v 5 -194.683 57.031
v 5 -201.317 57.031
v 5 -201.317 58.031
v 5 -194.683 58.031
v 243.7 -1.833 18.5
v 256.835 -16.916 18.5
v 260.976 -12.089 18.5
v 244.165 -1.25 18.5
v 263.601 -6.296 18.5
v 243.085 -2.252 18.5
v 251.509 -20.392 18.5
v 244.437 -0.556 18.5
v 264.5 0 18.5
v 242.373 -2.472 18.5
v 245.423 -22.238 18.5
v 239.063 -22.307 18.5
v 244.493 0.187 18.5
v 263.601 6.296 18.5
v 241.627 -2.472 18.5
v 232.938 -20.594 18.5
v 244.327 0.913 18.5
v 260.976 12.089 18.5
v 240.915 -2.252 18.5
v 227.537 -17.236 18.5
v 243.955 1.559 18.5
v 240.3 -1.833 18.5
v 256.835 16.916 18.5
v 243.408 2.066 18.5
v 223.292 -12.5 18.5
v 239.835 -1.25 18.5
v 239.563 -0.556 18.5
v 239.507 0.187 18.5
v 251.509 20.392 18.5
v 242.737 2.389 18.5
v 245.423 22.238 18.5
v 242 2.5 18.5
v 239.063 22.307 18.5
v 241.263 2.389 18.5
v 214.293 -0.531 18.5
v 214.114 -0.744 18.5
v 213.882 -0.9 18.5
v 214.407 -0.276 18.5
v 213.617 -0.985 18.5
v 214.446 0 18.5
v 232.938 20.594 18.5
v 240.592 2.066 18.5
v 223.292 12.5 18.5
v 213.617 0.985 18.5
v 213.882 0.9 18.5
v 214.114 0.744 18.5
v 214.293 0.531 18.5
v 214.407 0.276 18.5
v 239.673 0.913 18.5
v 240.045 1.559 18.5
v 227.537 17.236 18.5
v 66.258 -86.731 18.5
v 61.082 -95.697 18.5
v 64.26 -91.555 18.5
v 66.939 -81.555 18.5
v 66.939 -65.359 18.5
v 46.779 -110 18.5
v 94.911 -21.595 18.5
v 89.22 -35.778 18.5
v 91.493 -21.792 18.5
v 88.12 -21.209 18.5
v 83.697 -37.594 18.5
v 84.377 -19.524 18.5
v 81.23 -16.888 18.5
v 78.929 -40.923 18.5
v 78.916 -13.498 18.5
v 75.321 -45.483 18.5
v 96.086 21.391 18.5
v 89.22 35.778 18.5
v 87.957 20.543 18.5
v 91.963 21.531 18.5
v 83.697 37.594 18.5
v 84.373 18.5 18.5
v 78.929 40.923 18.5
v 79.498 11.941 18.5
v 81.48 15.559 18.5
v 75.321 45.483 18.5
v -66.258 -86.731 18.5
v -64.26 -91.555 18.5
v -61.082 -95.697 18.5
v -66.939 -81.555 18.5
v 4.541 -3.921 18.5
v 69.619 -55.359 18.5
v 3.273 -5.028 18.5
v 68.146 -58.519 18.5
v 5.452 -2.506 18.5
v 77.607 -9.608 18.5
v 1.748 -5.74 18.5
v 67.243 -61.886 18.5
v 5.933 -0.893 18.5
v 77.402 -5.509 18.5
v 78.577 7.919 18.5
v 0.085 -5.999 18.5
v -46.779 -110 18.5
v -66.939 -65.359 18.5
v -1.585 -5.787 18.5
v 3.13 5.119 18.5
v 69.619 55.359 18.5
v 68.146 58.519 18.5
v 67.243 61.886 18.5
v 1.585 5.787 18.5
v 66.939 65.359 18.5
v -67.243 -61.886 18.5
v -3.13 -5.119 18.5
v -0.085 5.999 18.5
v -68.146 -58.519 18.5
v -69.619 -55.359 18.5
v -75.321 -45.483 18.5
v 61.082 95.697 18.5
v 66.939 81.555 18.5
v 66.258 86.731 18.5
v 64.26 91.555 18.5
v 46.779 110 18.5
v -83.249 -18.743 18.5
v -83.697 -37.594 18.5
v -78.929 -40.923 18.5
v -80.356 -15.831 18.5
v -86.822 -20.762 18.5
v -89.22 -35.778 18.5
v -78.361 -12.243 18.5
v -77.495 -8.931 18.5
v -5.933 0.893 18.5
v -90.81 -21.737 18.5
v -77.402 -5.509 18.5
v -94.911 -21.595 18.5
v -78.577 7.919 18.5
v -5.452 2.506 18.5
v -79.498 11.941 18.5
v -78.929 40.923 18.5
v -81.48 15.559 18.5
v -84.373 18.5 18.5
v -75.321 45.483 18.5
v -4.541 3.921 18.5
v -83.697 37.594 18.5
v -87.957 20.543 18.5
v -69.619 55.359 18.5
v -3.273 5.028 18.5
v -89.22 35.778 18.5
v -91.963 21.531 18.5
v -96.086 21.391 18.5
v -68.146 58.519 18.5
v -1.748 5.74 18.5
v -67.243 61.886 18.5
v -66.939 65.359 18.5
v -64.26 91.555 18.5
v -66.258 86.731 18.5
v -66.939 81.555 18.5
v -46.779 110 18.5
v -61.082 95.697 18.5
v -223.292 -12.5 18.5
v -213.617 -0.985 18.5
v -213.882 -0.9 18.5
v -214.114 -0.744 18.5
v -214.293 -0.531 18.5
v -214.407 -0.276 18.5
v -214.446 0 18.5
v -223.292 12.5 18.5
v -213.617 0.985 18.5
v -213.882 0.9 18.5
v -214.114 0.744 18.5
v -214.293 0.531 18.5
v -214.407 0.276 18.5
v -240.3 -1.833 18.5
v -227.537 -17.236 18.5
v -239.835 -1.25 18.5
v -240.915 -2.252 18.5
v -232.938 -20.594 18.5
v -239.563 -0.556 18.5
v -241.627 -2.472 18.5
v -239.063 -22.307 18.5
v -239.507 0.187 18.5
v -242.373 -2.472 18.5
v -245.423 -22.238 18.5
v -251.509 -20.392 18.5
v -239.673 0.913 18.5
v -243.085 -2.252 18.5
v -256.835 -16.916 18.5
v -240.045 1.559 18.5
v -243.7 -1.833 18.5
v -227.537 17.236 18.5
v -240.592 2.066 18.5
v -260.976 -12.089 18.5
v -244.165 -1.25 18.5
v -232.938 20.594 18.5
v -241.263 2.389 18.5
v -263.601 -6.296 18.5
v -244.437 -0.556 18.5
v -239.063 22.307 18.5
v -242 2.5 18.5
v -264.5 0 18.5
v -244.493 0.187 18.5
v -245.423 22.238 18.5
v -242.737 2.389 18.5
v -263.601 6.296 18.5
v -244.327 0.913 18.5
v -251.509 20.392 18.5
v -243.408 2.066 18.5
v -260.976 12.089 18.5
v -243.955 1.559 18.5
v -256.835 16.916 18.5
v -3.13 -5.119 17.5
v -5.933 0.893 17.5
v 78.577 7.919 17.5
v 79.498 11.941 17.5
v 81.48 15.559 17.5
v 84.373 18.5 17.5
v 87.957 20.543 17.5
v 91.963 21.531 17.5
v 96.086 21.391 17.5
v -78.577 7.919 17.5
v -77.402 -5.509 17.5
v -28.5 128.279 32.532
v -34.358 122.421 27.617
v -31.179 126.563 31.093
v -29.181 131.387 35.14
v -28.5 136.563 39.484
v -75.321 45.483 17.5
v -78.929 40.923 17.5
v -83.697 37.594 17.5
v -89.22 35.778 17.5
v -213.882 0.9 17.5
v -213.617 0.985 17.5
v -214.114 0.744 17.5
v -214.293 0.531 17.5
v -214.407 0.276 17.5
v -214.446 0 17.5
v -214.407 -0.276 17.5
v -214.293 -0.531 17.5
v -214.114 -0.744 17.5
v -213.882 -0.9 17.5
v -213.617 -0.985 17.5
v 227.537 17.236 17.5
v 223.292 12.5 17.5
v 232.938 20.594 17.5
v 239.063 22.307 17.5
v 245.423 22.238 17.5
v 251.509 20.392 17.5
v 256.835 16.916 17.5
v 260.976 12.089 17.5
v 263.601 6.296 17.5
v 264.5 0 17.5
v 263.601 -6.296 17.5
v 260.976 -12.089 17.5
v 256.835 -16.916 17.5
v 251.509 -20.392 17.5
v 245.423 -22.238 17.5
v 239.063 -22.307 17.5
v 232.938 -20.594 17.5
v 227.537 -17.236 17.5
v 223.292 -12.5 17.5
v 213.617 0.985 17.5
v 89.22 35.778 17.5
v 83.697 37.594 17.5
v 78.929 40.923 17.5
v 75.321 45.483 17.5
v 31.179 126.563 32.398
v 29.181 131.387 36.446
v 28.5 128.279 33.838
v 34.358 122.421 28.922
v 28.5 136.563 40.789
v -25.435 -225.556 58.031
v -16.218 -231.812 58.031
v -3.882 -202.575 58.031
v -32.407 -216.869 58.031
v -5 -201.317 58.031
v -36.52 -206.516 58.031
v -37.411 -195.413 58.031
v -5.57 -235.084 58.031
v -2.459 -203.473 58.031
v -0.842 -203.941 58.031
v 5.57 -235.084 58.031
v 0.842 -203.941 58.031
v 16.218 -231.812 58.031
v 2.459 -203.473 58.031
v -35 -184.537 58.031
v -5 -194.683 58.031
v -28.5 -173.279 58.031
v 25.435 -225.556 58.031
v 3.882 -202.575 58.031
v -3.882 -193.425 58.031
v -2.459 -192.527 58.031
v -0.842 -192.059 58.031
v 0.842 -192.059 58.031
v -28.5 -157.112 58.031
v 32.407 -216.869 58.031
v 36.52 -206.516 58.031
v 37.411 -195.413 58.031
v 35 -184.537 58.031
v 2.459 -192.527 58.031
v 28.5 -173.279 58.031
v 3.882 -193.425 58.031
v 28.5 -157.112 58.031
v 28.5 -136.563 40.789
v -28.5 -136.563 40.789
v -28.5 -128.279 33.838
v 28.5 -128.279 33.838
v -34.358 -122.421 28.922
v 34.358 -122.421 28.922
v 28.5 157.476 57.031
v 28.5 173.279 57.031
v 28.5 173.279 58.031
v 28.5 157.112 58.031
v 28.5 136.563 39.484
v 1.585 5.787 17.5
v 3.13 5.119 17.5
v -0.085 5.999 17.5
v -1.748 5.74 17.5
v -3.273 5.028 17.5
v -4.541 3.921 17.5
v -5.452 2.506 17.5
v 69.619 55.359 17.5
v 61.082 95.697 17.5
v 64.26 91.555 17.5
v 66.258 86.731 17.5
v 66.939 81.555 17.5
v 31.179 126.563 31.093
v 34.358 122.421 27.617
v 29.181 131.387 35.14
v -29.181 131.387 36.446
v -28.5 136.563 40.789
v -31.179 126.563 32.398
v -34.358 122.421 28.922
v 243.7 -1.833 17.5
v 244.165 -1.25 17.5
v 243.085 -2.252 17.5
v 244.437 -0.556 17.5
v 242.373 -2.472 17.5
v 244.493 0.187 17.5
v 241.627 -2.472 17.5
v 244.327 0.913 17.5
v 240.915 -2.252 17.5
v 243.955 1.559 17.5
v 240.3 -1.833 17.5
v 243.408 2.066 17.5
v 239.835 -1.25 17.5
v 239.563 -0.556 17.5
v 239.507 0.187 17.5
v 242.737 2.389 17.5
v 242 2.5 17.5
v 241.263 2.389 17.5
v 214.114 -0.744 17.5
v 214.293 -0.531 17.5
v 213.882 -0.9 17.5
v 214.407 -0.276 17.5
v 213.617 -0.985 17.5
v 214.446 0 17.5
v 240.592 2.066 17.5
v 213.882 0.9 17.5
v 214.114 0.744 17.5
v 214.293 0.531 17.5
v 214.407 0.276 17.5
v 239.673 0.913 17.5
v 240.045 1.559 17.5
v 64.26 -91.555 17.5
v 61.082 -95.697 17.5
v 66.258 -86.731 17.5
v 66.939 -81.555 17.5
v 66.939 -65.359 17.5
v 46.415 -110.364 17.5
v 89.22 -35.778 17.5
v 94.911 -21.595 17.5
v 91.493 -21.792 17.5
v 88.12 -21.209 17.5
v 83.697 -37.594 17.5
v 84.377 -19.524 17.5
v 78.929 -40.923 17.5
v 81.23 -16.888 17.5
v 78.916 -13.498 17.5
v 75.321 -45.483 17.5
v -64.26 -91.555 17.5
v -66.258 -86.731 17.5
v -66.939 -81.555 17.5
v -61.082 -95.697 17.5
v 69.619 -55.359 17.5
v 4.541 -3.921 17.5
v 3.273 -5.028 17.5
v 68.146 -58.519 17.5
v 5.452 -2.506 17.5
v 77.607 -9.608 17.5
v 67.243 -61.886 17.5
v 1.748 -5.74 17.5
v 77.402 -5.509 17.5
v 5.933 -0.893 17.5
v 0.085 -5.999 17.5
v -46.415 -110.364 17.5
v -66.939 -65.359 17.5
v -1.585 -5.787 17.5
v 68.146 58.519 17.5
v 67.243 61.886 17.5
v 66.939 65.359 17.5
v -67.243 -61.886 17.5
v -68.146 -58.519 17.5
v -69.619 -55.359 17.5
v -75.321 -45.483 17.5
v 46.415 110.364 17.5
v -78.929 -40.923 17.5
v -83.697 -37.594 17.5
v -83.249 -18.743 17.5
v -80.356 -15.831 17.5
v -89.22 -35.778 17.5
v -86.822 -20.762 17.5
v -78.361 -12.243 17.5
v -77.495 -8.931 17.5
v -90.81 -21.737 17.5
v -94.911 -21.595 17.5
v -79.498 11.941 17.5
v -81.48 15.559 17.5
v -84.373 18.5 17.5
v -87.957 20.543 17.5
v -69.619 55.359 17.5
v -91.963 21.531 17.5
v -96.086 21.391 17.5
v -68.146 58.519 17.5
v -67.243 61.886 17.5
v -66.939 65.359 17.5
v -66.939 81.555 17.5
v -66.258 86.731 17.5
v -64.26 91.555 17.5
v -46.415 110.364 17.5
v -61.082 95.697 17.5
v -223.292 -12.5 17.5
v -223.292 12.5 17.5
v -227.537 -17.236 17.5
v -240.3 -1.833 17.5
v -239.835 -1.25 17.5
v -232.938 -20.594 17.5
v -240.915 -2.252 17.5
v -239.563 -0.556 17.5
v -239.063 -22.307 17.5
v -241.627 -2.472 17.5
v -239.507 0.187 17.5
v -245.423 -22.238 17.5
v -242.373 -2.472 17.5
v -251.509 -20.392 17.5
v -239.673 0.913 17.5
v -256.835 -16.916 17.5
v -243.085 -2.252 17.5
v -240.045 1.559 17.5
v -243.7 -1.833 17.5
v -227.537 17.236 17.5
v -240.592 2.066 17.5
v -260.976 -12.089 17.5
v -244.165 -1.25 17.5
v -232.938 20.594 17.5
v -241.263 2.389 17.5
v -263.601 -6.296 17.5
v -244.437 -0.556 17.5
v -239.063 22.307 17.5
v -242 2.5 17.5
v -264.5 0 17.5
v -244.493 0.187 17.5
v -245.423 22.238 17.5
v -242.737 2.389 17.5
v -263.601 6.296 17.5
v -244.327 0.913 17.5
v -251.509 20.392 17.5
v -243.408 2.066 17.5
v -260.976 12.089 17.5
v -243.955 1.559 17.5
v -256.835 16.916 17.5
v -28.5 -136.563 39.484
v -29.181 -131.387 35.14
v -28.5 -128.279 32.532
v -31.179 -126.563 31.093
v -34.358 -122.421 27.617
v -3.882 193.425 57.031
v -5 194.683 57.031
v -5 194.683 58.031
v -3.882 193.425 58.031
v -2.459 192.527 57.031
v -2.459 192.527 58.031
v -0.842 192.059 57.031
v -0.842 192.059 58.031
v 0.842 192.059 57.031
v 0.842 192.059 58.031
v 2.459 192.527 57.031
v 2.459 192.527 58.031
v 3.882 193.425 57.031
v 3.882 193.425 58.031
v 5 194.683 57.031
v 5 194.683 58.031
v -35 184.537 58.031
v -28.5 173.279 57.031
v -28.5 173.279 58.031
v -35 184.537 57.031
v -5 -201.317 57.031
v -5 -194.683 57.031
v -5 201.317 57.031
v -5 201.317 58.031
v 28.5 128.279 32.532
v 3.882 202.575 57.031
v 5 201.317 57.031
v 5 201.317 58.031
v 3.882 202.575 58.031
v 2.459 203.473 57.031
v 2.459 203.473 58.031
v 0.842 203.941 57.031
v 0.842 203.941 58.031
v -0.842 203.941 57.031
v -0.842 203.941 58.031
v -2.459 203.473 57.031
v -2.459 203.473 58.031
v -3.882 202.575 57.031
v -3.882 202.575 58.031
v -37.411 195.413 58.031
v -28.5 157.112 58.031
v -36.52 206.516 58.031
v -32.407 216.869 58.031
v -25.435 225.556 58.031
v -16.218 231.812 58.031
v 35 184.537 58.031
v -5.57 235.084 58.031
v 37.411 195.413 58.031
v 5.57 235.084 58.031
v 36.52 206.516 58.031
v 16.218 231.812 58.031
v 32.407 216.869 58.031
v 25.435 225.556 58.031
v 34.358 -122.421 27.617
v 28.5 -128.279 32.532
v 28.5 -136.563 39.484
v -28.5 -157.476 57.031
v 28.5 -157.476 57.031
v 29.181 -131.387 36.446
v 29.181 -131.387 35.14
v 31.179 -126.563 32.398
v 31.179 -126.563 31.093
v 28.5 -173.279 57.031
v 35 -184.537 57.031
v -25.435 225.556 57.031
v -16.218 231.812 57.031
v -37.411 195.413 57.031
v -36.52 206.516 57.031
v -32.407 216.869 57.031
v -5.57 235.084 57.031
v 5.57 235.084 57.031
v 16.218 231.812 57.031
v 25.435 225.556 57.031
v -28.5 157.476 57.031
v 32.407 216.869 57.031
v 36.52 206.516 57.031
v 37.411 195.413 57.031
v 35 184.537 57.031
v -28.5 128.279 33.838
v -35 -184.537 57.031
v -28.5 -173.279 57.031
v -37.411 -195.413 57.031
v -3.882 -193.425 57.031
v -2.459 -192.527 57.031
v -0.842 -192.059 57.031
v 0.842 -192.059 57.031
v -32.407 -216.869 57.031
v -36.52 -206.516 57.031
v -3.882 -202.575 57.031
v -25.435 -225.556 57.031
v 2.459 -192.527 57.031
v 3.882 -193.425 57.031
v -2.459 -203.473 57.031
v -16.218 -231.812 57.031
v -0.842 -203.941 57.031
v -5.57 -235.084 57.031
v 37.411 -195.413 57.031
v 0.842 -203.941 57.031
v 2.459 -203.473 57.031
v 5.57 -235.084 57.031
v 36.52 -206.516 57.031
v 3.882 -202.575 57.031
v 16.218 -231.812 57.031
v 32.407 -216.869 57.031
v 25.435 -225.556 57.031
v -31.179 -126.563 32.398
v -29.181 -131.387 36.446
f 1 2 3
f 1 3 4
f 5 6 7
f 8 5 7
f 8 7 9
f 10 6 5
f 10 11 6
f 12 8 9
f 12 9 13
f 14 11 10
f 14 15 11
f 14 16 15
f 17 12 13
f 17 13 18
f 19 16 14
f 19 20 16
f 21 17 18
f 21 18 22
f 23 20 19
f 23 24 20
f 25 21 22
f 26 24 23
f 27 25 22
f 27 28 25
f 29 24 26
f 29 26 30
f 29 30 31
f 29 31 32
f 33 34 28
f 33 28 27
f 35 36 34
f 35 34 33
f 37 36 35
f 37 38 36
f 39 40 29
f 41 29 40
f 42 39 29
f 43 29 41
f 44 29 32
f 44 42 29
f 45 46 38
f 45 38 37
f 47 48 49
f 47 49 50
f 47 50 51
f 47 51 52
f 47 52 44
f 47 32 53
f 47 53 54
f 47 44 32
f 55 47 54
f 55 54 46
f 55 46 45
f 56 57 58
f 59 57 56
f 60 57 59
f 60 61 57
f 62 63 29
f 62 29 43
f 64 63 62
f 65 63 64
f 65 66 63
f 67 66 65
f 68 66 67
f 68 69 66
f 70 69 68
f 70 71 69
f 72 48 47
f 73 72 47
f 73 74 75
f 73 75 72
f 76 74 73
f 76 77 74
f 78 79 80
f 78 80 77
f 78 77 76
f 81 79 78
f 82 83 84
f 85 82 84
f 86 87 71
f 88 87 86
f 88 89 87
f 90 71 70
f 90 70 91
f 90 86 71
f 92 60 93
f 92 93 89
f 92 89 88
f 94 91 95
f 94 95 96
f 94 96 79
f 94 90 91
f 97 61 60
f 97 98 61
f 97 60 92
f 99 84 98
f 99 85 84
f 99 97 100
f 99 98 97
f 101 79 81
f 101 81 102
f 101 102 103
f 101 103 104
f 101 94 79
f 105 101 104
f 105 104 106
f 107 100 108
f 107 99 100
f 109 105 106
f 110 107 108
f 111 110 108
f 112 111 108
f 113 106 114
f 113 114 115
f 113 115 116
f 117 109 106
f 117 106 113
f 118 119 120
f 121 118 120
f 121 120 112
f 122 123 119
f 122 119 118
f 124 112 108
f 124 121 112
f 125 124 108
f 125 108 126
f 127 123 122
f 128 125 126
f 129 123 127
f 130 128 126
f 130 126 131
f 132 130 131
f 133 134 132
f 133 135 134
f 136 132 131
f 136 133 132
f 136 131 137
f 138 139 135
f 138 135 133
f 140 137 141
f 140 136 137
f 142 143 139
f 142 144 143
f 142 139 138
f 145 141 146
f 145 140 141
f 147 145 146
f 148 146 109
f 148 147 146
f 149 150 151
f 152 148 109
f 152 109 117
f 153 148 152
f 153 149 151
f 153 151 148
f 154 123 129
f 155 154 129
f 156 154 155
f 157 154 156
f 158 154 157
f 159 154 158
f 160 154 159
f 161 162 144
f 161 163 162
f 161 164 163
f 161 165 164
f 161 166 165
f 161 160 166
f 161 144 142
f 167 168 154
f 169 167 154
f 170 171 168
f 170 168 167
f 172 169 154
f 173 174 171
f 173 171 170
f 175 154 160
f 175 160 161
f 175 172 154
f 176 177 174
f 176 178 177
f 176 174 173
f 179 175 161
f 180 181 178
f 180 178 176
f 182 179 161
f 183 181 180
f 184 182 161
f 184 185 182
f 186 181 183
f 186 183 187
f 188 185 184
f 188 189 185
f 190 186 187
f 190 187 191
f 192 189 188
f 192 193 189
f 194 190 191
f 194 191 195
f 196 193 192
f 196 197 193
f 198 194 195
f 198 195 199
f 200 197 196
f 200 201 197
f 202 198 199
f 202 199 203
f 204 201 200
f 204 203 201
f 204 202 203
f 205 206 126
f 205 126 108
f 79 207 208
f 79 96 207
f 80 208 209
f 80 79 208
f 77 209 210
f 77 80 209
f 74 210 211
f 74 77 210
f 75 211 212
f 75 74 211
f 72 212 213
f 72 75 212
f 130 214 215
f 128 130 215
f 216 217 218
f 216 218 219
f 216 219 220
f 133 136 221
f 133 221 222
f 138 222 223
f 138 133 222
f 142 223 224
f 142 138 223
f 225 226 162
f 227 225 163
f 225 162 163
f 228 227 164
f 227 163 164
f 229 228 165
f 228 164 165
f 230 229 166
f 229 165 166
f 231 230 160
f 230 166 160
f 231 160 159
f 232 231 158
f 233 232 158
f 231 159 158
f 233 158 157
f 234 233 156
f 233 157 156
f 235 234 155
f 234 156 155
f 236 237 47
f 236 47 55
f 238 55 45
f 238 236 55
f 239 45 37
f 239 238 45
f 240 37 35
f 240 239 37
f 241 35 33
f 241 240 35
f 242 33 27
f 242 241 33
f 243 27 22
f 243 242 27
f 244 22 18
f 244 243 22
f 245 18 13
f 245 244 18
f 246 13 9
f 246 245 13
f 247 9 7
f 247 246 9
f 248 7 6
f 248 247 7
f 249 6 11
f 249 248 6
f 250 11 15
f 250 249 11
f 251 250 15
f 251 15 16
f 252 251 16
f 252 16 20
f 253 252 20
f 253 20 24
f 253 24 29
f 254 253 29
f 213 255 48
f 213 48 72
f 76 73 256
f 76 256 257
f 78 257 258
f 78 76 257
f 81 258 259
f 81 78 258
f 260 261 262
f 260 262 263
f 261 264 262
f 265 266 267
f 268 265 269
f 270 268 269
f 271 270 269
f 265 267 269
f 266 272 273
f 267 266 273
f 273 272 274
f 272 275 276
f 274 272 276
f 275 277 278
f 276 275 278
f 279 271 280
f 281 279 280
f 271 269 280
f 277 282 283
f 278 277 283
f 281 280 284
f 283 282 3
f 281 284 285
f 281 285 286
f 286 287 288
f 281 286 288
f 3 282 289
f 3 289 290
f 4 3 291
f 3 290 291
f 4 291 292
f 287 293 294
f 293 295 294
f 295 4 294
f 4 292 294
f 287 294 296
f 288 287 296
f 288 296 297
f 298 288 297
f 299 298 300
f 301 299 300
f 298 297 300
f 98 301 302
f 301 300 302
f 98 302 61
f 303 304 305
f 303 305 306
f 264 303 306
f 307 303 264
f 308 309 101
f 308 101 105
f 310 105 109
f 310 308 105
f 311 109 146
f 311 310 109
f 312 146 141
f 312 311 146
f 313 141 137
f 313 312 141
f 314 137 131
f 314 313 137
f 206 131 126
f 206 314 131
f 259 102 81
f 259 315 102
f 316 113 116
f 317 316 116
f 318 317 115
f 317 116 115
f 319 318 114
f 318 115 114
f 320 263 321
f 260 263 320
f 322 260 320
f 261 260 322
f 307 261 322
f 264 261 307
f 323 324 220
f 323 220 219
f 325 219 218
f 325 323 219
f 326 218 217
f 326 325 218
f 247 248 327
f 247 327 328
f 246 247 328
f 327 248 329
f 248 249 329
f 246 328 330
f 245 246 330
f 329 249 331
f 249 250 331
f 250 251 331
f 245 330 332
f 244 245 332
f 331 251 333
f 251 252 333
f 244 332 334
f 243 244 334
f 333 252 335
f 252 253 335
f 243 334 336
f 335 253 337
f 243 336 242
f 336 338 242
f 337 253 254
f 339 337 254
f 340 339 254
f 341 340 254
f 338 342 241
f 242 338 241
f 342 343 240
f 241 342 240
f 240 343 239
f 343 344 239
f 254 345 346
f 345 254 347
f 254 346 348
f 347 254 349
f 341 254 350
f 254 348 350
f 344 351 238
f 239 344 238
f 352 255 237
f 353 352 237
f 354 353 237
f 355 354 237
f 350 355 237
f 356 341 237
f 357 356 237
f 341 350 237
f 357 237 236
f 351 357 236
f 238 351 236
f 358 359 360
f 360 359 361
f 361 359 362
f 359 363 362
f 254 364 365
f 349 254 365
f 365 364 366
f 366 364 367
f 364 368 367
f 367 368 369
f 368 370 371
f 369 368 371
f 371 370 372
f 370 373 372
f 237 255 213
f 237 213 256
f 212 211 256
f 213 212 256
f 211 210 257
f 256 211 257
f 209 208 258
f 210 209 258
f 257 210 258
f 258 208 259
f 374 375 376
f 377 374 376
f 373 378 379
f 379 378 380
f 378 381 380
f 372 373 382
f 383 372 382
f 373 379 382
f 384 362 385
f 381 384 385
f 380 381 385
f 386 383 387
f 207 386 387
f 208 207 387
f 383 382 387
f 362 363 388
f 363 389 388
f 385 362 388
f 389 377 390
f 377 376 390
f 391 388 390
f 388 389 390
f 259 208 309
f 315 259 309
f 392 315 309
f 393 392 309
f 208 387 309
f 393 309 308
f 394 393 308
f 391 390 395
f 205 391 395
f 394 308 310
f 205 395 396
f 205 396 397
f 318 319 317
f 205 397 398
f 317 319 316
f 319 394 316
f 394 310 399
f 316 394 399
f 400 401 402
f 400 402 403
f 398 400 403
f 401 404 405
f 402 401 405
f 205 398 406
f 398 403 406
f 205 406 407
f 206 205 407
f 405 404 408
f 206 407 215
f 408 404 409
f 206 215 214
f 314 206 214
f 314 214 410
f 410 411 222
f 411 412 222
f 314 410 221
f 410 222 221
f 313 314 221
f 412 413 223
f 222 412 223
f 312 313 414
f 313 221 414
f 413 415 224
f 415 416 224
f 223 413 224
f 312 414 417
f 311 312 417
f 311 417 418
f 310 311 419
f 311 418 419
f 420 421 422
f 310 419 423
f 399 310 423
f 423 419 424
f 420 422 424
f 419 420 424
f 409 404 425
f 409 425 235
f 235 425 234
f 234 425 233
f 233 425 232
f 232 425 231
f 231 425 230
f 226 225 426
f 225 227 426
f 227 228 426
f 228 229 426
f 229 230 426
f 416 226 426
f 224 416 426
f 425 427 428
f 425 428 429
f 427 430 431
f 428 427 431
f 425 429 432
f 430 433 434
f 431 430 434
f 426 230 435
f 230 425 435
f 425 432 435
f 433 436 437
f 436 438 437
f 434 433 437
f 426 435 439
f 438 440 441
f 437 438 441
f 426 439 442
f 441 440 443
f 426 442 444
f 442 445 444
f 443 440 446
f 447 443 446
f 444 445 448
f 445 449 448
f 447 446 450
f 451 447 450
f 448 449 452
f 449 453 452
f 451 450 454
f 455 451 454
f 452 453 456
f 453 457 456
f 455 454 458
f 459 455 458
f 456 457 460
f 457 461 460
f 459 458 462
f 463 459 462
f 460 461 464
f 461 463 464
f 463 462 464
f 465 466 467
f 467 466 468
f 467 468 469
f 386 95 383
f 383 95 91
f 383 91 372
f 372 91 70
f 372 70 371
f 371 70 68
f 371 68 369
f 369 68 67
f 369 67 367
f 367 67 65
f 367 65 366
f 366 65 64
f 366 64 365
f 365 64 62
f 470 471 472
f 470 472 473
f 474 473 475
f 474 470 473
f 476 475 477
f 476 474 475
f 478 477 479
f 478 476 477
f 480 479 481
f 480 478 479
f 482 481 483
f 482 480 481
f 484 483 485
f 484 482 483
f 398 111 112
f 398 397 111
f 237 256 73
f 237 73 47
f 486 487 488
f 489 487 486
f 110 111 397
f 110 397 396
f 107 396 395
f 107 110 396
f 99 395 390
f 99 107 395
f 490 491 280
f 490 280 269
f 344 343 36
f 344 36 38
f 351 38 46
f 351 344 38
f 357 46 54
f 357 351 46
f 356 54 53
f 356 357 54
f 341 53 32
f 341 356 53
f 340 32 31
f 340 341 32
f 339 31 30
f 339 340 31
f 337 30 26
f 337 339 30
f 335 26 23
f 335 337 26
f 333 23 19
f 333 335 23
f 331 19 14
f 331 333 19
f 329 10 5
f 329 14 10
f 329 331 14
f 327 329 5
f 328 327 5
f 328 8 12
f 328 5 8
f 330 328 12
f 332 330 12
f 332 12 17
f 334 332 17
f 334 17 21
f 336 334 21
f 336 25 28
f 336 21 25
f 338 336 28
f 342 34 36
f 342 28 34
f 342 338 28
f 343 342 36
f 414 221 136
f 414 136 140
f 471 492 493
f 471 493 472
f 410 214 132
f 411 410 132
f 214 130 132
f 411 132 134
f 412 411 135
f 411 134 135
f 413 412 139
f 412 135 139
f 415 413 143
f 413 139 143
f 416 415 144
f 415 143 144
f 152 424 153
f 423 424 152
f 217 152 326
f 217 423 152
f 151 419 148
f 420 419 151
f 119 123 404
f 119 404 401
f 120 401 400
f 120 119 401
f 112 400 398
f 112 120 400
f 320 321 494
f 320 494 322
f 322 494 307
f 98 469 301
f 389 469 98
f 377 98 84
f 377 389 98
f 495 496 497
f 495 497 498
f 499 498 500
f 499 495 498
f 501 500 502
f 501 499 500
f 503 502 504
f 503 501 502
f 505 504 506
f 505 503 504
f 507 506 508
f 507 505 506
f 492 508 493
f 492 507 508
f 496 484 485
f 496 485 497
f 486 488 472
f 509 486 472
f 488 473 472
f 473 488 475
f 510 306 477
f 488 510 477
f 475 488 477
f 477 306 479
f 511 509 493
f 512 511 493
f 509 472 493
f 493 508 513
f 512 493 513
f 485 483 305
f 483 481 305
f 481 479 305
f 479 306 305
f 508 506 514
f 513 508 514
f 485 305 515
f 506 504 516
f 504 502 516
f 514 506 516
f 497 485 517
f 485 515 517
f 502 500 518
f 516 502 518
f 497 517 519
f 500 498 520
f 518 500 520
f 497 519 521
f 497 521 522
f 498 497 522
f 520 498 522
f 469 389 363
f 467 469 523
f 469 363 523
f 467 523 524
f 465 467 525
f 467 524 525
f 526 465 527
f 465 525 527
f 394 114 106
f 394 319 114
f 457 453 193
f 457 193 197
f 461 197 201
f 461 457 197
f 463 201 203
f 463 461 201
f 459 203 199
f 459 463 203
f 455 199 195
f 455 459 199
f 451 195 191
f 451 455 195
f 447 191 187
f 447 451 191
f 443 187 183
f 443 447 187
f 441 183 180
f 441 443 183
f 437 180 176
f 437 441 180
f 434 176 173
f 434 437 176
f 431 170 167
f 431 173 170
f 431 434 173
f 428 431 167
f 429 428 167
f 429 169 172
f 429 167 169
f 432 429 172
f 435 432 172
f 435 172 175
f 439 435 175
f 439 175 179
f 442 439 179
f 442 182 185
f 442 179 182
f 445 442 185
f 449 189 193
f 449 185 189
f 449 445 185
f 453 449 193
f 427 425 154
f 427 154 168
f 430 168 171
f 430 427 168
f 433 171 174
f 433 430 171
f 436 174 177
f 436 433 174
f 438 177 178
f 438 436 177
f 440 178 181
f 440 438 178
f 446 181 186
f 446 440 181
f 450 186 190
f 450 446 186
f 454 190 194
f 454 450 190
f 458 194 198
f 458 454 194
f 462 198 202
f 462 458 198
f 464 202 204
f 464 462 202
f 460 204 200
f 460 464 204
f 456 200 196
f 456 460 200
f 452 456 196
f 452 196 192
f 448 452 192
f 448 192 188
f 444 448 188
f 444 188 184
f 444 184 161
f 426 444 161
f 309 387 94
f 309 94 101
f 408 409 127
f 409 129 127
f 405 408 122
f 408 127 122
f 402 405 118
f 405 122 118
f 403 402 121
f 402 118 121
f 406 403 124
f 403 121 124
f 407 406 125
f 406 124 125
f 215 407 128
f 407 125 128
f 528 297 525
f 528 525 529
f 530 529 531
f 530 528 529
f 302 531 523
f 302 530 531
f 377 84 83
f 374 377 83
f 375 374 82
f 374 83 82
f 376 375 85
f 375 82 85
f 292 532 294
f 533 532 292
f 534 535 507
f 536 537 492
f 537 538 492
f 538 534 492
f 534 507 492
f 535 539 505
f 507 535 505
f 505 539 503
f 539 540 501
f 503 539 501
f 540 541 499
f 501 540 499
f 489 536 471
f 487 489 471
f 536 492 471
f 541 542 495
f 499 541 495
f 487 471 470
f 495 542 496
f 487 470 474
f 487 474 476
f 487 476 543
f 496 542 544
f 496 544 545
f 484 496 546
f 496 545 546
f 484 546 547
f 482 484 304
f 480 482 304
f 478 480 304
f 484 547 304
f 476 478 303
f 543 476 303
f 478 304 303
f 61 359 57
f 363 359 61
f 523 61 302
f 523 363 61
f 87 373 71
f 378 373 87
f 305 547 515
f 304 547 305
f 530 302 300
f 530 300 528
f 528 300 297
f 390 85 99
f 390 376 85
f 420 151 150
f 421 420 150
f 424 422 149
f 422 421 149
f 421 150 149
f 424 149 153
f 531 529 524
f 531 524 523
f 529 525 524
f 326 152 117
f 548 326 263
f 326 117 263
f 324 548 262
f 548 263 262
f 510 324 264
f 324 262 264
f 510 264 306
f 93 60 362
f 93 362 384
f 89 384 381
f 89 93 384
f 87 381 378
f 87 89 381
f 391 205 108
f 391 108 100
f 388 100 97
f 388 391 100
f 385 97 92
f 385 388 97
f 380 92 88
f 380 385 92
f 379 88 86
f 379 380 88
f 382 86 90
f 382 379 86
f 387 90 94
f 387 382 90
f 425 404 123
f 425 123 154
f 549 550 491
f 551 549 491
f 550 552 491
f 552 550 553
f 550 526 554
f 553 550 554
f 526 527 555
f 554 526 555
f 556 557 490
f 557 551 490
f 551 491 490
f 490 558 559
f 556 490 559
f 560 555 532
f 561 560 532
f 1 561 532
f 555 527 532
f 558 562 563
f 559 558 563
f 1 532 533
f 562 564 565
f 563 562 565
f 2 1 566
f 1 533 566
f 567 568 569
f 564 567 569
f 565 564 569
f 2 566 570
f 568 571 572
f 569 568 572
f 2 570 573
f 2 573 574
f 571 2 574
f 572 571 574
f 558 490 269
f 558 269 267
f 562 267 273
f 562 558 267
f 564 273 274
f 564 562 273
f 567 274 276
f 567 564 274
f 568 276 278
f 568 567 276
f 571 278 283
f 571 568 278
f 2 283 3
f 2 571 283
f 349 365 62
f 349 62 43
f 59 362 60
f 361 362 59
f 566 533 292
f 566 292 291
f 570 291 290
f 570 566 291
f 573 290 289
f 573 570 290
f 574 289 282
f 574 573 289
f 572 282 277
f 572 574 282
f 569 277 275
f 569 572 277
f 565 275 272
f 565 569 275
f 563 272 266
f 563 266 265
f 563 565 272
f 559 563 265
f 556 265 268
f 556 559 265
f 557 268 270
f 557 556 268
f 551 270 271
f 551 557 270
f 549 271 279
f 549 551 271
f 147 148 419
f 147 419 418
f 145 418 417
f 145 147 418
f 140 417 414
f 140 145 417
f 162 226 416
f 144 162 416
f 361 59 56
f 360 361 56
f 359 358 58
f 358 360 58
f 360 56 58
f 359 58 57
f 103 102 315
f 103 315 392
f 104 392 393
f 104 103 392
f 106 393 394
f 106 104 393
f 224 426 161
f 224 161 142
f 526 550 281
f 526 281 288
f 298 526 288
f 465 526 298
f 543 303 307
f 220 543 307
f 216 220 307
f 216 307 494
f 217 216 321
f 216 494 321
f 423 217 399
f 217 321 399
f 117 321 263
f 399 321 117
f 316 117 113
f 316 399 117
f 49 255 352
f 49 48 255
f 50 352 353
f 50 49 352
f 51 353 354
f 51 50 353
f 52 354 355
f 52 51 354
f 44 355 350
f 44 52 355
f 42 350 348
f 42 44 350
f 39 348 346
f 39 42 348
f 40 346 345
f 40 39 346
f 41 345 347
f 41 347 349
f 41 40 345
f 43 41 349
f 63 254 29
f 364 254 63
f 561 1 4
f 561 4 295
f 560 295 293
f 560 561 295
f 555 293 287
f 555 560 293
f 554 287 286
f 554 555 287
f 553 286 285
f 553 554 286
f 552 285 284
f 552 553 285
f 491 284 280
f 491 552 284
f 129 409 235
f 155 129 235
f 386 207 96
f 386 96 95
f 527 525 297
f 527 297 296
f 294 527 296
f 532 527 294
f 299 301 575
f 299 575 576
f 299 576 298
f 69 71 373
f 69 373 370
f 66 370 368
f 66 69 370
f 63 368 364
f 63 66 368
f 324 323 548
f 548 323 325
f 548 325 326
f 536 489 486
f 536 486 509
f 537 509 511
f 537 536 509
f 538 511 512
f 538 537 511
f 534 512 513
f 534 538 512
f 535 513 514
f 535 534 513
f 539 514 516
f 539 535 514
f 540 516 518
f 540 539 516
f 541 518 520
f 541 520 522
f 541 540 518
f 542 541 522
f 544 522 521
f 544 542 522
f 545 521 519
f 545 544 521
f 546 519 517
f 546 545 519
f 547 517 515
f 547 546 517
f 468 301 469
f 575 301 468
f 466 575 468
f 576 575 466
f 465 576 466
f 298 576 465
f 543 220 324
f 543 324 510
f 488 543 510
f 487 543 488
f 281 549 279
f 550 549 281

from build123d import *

# Parameters (mm, degrees)
SALIENTE_EXTRUIR1_DEPTH     = 271
CORTAR_EXTRUIR9_DEPTH       = 372.904084134
CORTAR_EXTRUIR9_DEPTH_BACK  = 372.904084134
CROQUIS4_R                  = 2.5
CORTAR_EXTRUIR10_DEPTH      = 372.904084134
CORTAR_EXTRUIR10_DEPTH_BACK = 372.904084134
CROQUIS2_W                  = 581.580028242
CROQUIS2_H                  = 554.061756016
REDONDEO1_R                 = 20
REDONDEO2_R                 = 15
REDONDEO3_R                 = 1


with BuildPart() as part:
    # Croquis1 → Saliente-Extruir1 (new, symmetric)
    with BuildSketch(Plane(origin=(0, 0, 0), x_dir=(0, 0, -1), z_dir=(1, 0, 0))):
        Polygon((-18.5, -110), (-18.5, 110), (-58.031437996, 157.111733252), (-58.031437996, 248), (-57.031437996, 248), (-57.031437996, 157.475703486), (-17.5, 110.363970234), (-17.5, -110.363970234), (-57.031437996, -157.475703486), (-57.031437996, -248), (-58.031437996, -248), (-58.031437996, -157.111733252), align=None)
    extrude(amount=SALIENTE_EXTRUIR1_DEPTH, both=True)

    # Croquis4 → Cortar-Extruir9 (cut, two sides: drawn at the far end of the back side and taken through both)
    with BuildSketch(Plane.XY.offset(-CORTAR_EXTRUIR9_DEPTH_BACK)):
        with Locations(Location((-242, 0, 0), (0, 0, 90))):
            Circle(CROQUIS4_R)
        with Locations(Location((242, 0, 0), (0, 0, 90))):
            Circle(CROQUIS4_R)
        with BuildLine():
            Line((-5, 201.31662479), (-5, 194.68337521))
            ThreePointArc((-5, 194.68337521), (0, 192), (5, 194.68337521))
            Line((5, 194.68337521), (5, 201.31662479))
            ThreePointArc((5, 201.31662479), (0, 204), (-5, 201.31662479))
        make_face()
        with BuildLine():
            Line((5, -201.31662479), (5, -194.68337521))
            ThreePointArc((5, -194.68337521), (0, -192), (-5, -194.68337521))
            Line((-5, -194.68337521), (-5, -201.31662479))
            ThreePointArc((-5, -201.31662479), (0, -204), (5, -201.31662479))
        make_face()
        with BuildLine():
            Line((-5.933205139, 0.892791565), (-3.129872731, -5.118974183))
            ThreePointArc((-3.129872731, -5.118974183), (2.53570957, -5.437846722), (5.933205139, -0.892791565))
            Line((5.933205139, -0.892791565), (3.129872731, 5.118974183))
            ThreePointArc((3.129872731, 5.118974183), (-2.53570957, 5.437846722), (-5.933205139, 0.892791565))
        make_face()
    extrude(amount=CORTAR_EXTRUIR9_DEPTH + CORTAR_EXTRUIR9_DEPTH_BACK, mode=Mode.SUBTRACT)

    # Croquis2 → Cortar-Extruir10 (cut, two sides: drawn at the far end of the back side and taken through both)
    # profile 1 of 3: a face of its own
    with BuildSketch(Plane.XY.offset(-CORTAR_EXTRUIR10_DEPTH_BACK)):
        Rectangle(CROQUIS2_W, CROQUIS2_H)
        with BuildLine():
            Line((80, 37.378360334), (223.291713066, 12.5))
            ThreePointArc((223.291713066, 12.5), (264.5, 0), (223.291713066, -12.5))
            Line((223.291713066, -12.5), (80, -37.378360334))
            Line((80, -37.378360334), (66.939390249, -60))
            Line((66.939390249, -60), (66.939390249, -89.839367484))
            Line((66.939390249, -89.839367484), (28.5, -128.278757733))
            Line((28.5, -128.278757733), (28.5, -173.278757733))
            Line((28.5, -173.278757733), (35, -184.537087982))
            ThreePointArc((35, -184.537087982), (0, -235.5), (-35, -184.537087982))
            Line((-35, -184.537087982), (-28.5, -173.278757733))
            Line((-28.5, -173.278757733), (-28.5, -128.278757733))
            Line((-28.5, -128.278757733), (-66.939390249, -89.839367484))
            Line((-66.939390249, -89.839367484), (-66.939390249, -60))
            Line((-66.939390249, -60), (-80, -37.378360334))
            Line((-80, -37.378360334), (-223.291713066, -12.5))
            ThreePointArc((-223.291713066, -12.5), (-264.5, 0), (-223.291713066, 12.5))
            Line((-223.291713066, 12.5), (-80, 37.378360334))
            Line((-80, 37.378360334), (-66.939390249, 60))
            Line((-66.939390249, 60), (-66.939390249, 89.839367484))
            Line((-66.939390249, 89.839367484), (-28.5, 128.278757733))
            Line((-28.5, 128.278757733), (-28.5, 173.278757733))
            Line((-28.5, 173.278757733), (-35, 184.537087982))
            ThreePointArc((-35, 184.537087982), (0, 235.5), (35, 184.537087982))
            Line((35, 184.537087982), (28.5, 173.278757733))
            Line((28.5, 173.278757733), (28.5, 128.278757733))
            Line((28.5, 128.278757733), (66.939390249, 89.839367484))
            Line((66.939390249, 89.839367484), (66.939390249, 60))
            Line((66.939390249, 60), (80, 37.378360334))
        make_face(mode=Mode.SUBTRACT)
    # profile 2 of 3: a face of its own
    with BuildSketch(Plane.XY.offset(-CORTAR_EXTRUIR10_DEPTH_BACK)):
        Polygon((-75.703100415, -24.92990815), (-80, -24.183878851), (-219.291713066, 0), (-80, 24.183878851), align=None)
    # profile 3 of 3: a face of its own
    with BuildSketch(Plane.XY.offset(-CORTAR_EXTRUIR10_DEPTH_BACK)):
        Polygon((80, 24.183878851), (75.703100415, -24.92990815), (80, -24.183878851), (219.291713066, 0), align=None)
    extrude(amount=CORTAR_EXTRUIR10_DEPTH + CORTAR_EXTRUIR10_DEPTH_BACK, mode=Mode.SUBTRACT)

    # Redondeo1
    # the kernel refuses this fillet: 20 mm, written as the material it adds along each edge
    with BuildSketch(Plane(origin=(-28.5, 128.278757733, 54.548376991), x_dir=(-0.7071067811865487, -0.7071067811865461, 0), z_dir=(0, 0, -1))) as redondeo1_piece_1_section:
        with BuildLine():
            CenterArc((REDONDEO1_R * 0.414213562373, REDONDEO1_R), REDONDEO1_R, 225, 45)
            Line((-REDONDEO1_R * 0.292893218813, REDONDEO1_R * 0.292893218813), (0, 0))
            Line((0, 0), (REDONDEO1_R * 0.414213562373, 0))
        make_face()
    redondeo1_piece_1 = extrude(amount=42.726763527, mode=Mode.PRIVATE)
    redondeo1_piece_1 = split(redondeo1_piece_1, bisect_by=Plane(origin=(-29.703304355, 128.455788912, 33.986245669), z_dir=(0, 0.6427876096865383, -0.7660444431189789)), keep=Keep.TOP, mode=Mode.PRIVATE)
    redondeo1_piece_1 = split(redondeo1_piece_1, bisect_by=Plane(origin=(-29.703304355, 129.098576521, 33.220201226), z_dir=(0, -0.6427876096865383, 0.766044443118979)), keep=Keep.TOP, mode=Mode.PRIVATE)
    add(redondeo1_piece_1)
    with BuildSketch(Plane(origin=(80, 37.378360334, 18.5), x_dir=(0.9852603921679417, -0.17106127447518257, 0), z_dir=(0, 0, -1)), Plane(origin=(80, -37.378360334, 18.5), x_dir=(-0.5000000000000011, -0.8660254037844379, 0), z_dir=(0, 0, -1)), Plane(origin=(-80, -37.378360334, 18.5), x_dir=(-0.9852603921679428, 0.17106127447517586, 0), z_dir=(0, 0, -1)), Plane(origin=(-80, 37.378360334, 18.5), x_dir=(0.5000000000000069, 0.8660254037844347, 0), z_dir=(0, 0, -1))) as redondeo1_piece_2:
        with BuildLine():
            CenterArc((REDONDEO1_R * 0.467907265941, -REDONDEO1_R), REDONDEO1_R, 90, 50.15047048)
            Line((-REDONDEO1_R * 0.299822625782, -REDONDEO1_R * 0.359226394617), (0, 0))
            Line((0, 0), (REDONDEO1_R * 0.467907265941, 0))
        make_face()
    extrude(amount=1)
    with BuildSketch(Plane(origin=(66.939390249, -60, 18.5), x_dir=(0, -1, 0), z_dir=(0, 0, -1)), Plane(origin=(-66.939390249, -60, 18.5), x_dir=(-0.5000000000000052, 0.8660254037844356, 0), z_dir=(0, 0, -1)), Plane(origin=(-66.939390249, 60, 18.5), x_dir=(0, 1, 0), z_dir=(0, 0, -1)), Plane(origin=(66.939390249, 60, 18.5), x_dir=(0.5000000000000032, -0.8660254037844367, 0), z_dir=(0, 0, -1))) as redondeo1_piece_3:
        with BuildLine():
            CenterArc((REDONDEO1_R * 0.267949192431, -REDONDEO1_R), REDONDEO1_R, 90, 30)
            Line((-REDONDEO1_R * 0.232050807569, -REDONDEO1_R * 0.133974596216), (0, 0))
            Line((0, 0), (REDONDEO1_R * 0.267949192431, 0))
        make_face()
    extrude(amount=1)
    with BuildSketch(Plane(origin=(28.5, 128.278757733, 54.548376991), x_dir=(0.7071067811865498, -0.7071067811865451, 0), z_dir=(0, 0, -1))) as redondeo1_piece_4_section:
        with BuildLine():
            CenterArc((REDONDEO1_R * 0.414213562373, -REDONDEO1_R), REDONDEO1_R, 90, 45)
            Line((-REDONDEO1_R * 0.292893218813, -REDONDEO1_R * 0.292893218813), (0, 0))
            Line((0, 0), (REDONDEO1_R * 0.414213562373, 0))
        make_face()
    redondeo1_piece_4 = extrude(amount=42.726763527, mode=Mode.PRIVATE)
    redondeo1_piece_4 = split(redondeo1_piece_4, bisect_by=Plane(origin=(29.703304355, 128.455788912, 33.986245669), z_dir=(0, 0.6427876096865383, -0.7660444431189789)), keep=Keep.TOP, mode=Mode.PRIVATE)
    redondeo1_piece_4 = split(redondeo1_piece_4, bisect_by=Plane(origin=(29.703304355, 129.098576521, 33.220201226), z_dir=(0, -0.6427876096865383, 0.766044443118979)), keep=Keep.TOP, mode=Mode.PRIVATE)
    add(redondeo1_piece_4)
    with BuildSketch(Plane(origin=(28.5, -128.278757733, 54.548376991), x_dir=(0.7071067811865518, 0.7071067811865431, 0), z_dir=(0, 0, -1))) as redondeo1_piece_5_section:
        with BuildLine():
            CenterArc((REDONDEO1_R * 0.414213562373, REDONDEO1_R), REDONDEO1_R, 225, 45)
            Line((-REDONDEO1_R * 0.292893218813, REDONDEO1_R * 0.292893218813), (0, 0))
            Line((0, 0), (REDONDEO1_R * 0.414213562373, 0))
        make_face()
    redondeo1_piece_5 = extrude(amount=42.726763527, mode=Mode.PRIVATE)
    redondeo1_piece_5 = split(redondeo1_piece_5, bisect_by=Plane(origin=(29.703304355, -128.455788912, 33.986245669), z_dir=(0, -0.6427876096865381, -0.766044443118979)), keep=Keep.TOP, mode=Mode.PRIVATE)
    redondeo1_piece_5 = split(redondeo1_piece_5, bisect_by=Plane(origin=(29.703304355, -129.098576521, 33.220201226), z_dir=(0, 0.6427876096865377, 0.7660444431189795)), keep=Keep.TOP, mode=Mode.PRIVATE)
    add(redondeo1_piece_5)
    with BuildSketch(Plane(origin=(-28.5, -128.278757733, 54.548376991), x_dir=(-0.7071067811865503, 0.7071067811865448, 0), z_dir=(0, 0, -1))) as redondeo1_piece_6_section:
        with BuildLine():
            CenterArc((REDONDEO1_R * 0.414213562373, -REDONDEO1_R), REDONDEO1_R, 90, 45)
            Line((-REDONDEO1_R * 0.292893218813, -REDONDEO1_R * 0.292893218813), (0, 0))
            Line((0, 0), (REDONDEO1_R * 0.414213562373, 0))
        make_face()
    redondeo1_piece_6 = extrude(amount=42.726763527, mode=Mode.PRIVATE)
    redondeo1_piece_6 = split(redondeo1_piece_6, bisect_by=Plane(origin=(-29.703304355, -128.455788912, 33.986245669), z_dir=(0, -0.6427876096865381, -0.766044443118979)), keep=Keep.TOP, mode=Mode.PRIVATE)
    redondeo1_piece_6 = split(redondeo1_piece_6, bisect_by=Plane(origin=(-29.703304355, -129.098576521, 33.220201226), z_dir=(0, 0.6427876096865377, 0.7660444431189795)), keep=Keep.TOP, mode=Mode.PRIVATE)
    add(redondeo1_piece_6)
    # the kernel refuses this fillet: 20 mm, written as the material it takes off along each edge
    with BuildSketch(Plane(origin=(-66.939390249, -89.839367484, 39.210678119), x_dir=(0, 1, 0), z_dir=(0, 0, -1)), Plane(origin=(-66.939390249, 89.839367484, 39.210678119), x_dir=(0.7071067811865483, 0.7071067811865467, 0), z_dir=(0, 0, -1)), Plane(origin=(66.939390249, 89.839367484, 39.210678119), x_dir=(0, -1, 0), z_dir=(0, 0, -1)), Plane(origin=(66.939390249, -89.839367484, 39.210678119), x_dir=(-0.7071067811865501, -0.707106781186545, 0), z_dir=(0, 0, -1))) as redondeo1_2_piece_1:
        with BuildLine():
            CenterArc((REDONDEO1_R * 0.414213562373, REDONDEO1_R), REDONDEO1_R, 225, 45)
            Line((-REDONDEO1_R * 0.292893218813, REDONDEO1_R * 0.292893218813), (0, 0))
            Line((0, 0), (REDONDEO1_R * 0.414213562373, 0))
        make_face()
    extrude(amount=42.421356237, mode=Mode.SUBTRACT)

    # Redondeo2
    redondeo2_edges = [part.edges().sort_by_distance(p)[0] for p in [
        (80, 24.183878851, 18),
        (75.703100415, -24.92990815, 18),
        (-75.703100415, -24.92990815, 18),
        (-80, 24.183878851, 18),
    ]]
    fillet(redondeo2_edges, radius=REDONDEO2_R)

    # Redondeo3
    redondeo3_edges = [part.edges().sort_by_distance(p)[0] for p in [
        (219.291713066, 0, 18),
        (-219.291713066, 0, 18),
    ]]
    fillet(redondeo3_edges, radius=REDONDEO3_R)


solid = part.part
